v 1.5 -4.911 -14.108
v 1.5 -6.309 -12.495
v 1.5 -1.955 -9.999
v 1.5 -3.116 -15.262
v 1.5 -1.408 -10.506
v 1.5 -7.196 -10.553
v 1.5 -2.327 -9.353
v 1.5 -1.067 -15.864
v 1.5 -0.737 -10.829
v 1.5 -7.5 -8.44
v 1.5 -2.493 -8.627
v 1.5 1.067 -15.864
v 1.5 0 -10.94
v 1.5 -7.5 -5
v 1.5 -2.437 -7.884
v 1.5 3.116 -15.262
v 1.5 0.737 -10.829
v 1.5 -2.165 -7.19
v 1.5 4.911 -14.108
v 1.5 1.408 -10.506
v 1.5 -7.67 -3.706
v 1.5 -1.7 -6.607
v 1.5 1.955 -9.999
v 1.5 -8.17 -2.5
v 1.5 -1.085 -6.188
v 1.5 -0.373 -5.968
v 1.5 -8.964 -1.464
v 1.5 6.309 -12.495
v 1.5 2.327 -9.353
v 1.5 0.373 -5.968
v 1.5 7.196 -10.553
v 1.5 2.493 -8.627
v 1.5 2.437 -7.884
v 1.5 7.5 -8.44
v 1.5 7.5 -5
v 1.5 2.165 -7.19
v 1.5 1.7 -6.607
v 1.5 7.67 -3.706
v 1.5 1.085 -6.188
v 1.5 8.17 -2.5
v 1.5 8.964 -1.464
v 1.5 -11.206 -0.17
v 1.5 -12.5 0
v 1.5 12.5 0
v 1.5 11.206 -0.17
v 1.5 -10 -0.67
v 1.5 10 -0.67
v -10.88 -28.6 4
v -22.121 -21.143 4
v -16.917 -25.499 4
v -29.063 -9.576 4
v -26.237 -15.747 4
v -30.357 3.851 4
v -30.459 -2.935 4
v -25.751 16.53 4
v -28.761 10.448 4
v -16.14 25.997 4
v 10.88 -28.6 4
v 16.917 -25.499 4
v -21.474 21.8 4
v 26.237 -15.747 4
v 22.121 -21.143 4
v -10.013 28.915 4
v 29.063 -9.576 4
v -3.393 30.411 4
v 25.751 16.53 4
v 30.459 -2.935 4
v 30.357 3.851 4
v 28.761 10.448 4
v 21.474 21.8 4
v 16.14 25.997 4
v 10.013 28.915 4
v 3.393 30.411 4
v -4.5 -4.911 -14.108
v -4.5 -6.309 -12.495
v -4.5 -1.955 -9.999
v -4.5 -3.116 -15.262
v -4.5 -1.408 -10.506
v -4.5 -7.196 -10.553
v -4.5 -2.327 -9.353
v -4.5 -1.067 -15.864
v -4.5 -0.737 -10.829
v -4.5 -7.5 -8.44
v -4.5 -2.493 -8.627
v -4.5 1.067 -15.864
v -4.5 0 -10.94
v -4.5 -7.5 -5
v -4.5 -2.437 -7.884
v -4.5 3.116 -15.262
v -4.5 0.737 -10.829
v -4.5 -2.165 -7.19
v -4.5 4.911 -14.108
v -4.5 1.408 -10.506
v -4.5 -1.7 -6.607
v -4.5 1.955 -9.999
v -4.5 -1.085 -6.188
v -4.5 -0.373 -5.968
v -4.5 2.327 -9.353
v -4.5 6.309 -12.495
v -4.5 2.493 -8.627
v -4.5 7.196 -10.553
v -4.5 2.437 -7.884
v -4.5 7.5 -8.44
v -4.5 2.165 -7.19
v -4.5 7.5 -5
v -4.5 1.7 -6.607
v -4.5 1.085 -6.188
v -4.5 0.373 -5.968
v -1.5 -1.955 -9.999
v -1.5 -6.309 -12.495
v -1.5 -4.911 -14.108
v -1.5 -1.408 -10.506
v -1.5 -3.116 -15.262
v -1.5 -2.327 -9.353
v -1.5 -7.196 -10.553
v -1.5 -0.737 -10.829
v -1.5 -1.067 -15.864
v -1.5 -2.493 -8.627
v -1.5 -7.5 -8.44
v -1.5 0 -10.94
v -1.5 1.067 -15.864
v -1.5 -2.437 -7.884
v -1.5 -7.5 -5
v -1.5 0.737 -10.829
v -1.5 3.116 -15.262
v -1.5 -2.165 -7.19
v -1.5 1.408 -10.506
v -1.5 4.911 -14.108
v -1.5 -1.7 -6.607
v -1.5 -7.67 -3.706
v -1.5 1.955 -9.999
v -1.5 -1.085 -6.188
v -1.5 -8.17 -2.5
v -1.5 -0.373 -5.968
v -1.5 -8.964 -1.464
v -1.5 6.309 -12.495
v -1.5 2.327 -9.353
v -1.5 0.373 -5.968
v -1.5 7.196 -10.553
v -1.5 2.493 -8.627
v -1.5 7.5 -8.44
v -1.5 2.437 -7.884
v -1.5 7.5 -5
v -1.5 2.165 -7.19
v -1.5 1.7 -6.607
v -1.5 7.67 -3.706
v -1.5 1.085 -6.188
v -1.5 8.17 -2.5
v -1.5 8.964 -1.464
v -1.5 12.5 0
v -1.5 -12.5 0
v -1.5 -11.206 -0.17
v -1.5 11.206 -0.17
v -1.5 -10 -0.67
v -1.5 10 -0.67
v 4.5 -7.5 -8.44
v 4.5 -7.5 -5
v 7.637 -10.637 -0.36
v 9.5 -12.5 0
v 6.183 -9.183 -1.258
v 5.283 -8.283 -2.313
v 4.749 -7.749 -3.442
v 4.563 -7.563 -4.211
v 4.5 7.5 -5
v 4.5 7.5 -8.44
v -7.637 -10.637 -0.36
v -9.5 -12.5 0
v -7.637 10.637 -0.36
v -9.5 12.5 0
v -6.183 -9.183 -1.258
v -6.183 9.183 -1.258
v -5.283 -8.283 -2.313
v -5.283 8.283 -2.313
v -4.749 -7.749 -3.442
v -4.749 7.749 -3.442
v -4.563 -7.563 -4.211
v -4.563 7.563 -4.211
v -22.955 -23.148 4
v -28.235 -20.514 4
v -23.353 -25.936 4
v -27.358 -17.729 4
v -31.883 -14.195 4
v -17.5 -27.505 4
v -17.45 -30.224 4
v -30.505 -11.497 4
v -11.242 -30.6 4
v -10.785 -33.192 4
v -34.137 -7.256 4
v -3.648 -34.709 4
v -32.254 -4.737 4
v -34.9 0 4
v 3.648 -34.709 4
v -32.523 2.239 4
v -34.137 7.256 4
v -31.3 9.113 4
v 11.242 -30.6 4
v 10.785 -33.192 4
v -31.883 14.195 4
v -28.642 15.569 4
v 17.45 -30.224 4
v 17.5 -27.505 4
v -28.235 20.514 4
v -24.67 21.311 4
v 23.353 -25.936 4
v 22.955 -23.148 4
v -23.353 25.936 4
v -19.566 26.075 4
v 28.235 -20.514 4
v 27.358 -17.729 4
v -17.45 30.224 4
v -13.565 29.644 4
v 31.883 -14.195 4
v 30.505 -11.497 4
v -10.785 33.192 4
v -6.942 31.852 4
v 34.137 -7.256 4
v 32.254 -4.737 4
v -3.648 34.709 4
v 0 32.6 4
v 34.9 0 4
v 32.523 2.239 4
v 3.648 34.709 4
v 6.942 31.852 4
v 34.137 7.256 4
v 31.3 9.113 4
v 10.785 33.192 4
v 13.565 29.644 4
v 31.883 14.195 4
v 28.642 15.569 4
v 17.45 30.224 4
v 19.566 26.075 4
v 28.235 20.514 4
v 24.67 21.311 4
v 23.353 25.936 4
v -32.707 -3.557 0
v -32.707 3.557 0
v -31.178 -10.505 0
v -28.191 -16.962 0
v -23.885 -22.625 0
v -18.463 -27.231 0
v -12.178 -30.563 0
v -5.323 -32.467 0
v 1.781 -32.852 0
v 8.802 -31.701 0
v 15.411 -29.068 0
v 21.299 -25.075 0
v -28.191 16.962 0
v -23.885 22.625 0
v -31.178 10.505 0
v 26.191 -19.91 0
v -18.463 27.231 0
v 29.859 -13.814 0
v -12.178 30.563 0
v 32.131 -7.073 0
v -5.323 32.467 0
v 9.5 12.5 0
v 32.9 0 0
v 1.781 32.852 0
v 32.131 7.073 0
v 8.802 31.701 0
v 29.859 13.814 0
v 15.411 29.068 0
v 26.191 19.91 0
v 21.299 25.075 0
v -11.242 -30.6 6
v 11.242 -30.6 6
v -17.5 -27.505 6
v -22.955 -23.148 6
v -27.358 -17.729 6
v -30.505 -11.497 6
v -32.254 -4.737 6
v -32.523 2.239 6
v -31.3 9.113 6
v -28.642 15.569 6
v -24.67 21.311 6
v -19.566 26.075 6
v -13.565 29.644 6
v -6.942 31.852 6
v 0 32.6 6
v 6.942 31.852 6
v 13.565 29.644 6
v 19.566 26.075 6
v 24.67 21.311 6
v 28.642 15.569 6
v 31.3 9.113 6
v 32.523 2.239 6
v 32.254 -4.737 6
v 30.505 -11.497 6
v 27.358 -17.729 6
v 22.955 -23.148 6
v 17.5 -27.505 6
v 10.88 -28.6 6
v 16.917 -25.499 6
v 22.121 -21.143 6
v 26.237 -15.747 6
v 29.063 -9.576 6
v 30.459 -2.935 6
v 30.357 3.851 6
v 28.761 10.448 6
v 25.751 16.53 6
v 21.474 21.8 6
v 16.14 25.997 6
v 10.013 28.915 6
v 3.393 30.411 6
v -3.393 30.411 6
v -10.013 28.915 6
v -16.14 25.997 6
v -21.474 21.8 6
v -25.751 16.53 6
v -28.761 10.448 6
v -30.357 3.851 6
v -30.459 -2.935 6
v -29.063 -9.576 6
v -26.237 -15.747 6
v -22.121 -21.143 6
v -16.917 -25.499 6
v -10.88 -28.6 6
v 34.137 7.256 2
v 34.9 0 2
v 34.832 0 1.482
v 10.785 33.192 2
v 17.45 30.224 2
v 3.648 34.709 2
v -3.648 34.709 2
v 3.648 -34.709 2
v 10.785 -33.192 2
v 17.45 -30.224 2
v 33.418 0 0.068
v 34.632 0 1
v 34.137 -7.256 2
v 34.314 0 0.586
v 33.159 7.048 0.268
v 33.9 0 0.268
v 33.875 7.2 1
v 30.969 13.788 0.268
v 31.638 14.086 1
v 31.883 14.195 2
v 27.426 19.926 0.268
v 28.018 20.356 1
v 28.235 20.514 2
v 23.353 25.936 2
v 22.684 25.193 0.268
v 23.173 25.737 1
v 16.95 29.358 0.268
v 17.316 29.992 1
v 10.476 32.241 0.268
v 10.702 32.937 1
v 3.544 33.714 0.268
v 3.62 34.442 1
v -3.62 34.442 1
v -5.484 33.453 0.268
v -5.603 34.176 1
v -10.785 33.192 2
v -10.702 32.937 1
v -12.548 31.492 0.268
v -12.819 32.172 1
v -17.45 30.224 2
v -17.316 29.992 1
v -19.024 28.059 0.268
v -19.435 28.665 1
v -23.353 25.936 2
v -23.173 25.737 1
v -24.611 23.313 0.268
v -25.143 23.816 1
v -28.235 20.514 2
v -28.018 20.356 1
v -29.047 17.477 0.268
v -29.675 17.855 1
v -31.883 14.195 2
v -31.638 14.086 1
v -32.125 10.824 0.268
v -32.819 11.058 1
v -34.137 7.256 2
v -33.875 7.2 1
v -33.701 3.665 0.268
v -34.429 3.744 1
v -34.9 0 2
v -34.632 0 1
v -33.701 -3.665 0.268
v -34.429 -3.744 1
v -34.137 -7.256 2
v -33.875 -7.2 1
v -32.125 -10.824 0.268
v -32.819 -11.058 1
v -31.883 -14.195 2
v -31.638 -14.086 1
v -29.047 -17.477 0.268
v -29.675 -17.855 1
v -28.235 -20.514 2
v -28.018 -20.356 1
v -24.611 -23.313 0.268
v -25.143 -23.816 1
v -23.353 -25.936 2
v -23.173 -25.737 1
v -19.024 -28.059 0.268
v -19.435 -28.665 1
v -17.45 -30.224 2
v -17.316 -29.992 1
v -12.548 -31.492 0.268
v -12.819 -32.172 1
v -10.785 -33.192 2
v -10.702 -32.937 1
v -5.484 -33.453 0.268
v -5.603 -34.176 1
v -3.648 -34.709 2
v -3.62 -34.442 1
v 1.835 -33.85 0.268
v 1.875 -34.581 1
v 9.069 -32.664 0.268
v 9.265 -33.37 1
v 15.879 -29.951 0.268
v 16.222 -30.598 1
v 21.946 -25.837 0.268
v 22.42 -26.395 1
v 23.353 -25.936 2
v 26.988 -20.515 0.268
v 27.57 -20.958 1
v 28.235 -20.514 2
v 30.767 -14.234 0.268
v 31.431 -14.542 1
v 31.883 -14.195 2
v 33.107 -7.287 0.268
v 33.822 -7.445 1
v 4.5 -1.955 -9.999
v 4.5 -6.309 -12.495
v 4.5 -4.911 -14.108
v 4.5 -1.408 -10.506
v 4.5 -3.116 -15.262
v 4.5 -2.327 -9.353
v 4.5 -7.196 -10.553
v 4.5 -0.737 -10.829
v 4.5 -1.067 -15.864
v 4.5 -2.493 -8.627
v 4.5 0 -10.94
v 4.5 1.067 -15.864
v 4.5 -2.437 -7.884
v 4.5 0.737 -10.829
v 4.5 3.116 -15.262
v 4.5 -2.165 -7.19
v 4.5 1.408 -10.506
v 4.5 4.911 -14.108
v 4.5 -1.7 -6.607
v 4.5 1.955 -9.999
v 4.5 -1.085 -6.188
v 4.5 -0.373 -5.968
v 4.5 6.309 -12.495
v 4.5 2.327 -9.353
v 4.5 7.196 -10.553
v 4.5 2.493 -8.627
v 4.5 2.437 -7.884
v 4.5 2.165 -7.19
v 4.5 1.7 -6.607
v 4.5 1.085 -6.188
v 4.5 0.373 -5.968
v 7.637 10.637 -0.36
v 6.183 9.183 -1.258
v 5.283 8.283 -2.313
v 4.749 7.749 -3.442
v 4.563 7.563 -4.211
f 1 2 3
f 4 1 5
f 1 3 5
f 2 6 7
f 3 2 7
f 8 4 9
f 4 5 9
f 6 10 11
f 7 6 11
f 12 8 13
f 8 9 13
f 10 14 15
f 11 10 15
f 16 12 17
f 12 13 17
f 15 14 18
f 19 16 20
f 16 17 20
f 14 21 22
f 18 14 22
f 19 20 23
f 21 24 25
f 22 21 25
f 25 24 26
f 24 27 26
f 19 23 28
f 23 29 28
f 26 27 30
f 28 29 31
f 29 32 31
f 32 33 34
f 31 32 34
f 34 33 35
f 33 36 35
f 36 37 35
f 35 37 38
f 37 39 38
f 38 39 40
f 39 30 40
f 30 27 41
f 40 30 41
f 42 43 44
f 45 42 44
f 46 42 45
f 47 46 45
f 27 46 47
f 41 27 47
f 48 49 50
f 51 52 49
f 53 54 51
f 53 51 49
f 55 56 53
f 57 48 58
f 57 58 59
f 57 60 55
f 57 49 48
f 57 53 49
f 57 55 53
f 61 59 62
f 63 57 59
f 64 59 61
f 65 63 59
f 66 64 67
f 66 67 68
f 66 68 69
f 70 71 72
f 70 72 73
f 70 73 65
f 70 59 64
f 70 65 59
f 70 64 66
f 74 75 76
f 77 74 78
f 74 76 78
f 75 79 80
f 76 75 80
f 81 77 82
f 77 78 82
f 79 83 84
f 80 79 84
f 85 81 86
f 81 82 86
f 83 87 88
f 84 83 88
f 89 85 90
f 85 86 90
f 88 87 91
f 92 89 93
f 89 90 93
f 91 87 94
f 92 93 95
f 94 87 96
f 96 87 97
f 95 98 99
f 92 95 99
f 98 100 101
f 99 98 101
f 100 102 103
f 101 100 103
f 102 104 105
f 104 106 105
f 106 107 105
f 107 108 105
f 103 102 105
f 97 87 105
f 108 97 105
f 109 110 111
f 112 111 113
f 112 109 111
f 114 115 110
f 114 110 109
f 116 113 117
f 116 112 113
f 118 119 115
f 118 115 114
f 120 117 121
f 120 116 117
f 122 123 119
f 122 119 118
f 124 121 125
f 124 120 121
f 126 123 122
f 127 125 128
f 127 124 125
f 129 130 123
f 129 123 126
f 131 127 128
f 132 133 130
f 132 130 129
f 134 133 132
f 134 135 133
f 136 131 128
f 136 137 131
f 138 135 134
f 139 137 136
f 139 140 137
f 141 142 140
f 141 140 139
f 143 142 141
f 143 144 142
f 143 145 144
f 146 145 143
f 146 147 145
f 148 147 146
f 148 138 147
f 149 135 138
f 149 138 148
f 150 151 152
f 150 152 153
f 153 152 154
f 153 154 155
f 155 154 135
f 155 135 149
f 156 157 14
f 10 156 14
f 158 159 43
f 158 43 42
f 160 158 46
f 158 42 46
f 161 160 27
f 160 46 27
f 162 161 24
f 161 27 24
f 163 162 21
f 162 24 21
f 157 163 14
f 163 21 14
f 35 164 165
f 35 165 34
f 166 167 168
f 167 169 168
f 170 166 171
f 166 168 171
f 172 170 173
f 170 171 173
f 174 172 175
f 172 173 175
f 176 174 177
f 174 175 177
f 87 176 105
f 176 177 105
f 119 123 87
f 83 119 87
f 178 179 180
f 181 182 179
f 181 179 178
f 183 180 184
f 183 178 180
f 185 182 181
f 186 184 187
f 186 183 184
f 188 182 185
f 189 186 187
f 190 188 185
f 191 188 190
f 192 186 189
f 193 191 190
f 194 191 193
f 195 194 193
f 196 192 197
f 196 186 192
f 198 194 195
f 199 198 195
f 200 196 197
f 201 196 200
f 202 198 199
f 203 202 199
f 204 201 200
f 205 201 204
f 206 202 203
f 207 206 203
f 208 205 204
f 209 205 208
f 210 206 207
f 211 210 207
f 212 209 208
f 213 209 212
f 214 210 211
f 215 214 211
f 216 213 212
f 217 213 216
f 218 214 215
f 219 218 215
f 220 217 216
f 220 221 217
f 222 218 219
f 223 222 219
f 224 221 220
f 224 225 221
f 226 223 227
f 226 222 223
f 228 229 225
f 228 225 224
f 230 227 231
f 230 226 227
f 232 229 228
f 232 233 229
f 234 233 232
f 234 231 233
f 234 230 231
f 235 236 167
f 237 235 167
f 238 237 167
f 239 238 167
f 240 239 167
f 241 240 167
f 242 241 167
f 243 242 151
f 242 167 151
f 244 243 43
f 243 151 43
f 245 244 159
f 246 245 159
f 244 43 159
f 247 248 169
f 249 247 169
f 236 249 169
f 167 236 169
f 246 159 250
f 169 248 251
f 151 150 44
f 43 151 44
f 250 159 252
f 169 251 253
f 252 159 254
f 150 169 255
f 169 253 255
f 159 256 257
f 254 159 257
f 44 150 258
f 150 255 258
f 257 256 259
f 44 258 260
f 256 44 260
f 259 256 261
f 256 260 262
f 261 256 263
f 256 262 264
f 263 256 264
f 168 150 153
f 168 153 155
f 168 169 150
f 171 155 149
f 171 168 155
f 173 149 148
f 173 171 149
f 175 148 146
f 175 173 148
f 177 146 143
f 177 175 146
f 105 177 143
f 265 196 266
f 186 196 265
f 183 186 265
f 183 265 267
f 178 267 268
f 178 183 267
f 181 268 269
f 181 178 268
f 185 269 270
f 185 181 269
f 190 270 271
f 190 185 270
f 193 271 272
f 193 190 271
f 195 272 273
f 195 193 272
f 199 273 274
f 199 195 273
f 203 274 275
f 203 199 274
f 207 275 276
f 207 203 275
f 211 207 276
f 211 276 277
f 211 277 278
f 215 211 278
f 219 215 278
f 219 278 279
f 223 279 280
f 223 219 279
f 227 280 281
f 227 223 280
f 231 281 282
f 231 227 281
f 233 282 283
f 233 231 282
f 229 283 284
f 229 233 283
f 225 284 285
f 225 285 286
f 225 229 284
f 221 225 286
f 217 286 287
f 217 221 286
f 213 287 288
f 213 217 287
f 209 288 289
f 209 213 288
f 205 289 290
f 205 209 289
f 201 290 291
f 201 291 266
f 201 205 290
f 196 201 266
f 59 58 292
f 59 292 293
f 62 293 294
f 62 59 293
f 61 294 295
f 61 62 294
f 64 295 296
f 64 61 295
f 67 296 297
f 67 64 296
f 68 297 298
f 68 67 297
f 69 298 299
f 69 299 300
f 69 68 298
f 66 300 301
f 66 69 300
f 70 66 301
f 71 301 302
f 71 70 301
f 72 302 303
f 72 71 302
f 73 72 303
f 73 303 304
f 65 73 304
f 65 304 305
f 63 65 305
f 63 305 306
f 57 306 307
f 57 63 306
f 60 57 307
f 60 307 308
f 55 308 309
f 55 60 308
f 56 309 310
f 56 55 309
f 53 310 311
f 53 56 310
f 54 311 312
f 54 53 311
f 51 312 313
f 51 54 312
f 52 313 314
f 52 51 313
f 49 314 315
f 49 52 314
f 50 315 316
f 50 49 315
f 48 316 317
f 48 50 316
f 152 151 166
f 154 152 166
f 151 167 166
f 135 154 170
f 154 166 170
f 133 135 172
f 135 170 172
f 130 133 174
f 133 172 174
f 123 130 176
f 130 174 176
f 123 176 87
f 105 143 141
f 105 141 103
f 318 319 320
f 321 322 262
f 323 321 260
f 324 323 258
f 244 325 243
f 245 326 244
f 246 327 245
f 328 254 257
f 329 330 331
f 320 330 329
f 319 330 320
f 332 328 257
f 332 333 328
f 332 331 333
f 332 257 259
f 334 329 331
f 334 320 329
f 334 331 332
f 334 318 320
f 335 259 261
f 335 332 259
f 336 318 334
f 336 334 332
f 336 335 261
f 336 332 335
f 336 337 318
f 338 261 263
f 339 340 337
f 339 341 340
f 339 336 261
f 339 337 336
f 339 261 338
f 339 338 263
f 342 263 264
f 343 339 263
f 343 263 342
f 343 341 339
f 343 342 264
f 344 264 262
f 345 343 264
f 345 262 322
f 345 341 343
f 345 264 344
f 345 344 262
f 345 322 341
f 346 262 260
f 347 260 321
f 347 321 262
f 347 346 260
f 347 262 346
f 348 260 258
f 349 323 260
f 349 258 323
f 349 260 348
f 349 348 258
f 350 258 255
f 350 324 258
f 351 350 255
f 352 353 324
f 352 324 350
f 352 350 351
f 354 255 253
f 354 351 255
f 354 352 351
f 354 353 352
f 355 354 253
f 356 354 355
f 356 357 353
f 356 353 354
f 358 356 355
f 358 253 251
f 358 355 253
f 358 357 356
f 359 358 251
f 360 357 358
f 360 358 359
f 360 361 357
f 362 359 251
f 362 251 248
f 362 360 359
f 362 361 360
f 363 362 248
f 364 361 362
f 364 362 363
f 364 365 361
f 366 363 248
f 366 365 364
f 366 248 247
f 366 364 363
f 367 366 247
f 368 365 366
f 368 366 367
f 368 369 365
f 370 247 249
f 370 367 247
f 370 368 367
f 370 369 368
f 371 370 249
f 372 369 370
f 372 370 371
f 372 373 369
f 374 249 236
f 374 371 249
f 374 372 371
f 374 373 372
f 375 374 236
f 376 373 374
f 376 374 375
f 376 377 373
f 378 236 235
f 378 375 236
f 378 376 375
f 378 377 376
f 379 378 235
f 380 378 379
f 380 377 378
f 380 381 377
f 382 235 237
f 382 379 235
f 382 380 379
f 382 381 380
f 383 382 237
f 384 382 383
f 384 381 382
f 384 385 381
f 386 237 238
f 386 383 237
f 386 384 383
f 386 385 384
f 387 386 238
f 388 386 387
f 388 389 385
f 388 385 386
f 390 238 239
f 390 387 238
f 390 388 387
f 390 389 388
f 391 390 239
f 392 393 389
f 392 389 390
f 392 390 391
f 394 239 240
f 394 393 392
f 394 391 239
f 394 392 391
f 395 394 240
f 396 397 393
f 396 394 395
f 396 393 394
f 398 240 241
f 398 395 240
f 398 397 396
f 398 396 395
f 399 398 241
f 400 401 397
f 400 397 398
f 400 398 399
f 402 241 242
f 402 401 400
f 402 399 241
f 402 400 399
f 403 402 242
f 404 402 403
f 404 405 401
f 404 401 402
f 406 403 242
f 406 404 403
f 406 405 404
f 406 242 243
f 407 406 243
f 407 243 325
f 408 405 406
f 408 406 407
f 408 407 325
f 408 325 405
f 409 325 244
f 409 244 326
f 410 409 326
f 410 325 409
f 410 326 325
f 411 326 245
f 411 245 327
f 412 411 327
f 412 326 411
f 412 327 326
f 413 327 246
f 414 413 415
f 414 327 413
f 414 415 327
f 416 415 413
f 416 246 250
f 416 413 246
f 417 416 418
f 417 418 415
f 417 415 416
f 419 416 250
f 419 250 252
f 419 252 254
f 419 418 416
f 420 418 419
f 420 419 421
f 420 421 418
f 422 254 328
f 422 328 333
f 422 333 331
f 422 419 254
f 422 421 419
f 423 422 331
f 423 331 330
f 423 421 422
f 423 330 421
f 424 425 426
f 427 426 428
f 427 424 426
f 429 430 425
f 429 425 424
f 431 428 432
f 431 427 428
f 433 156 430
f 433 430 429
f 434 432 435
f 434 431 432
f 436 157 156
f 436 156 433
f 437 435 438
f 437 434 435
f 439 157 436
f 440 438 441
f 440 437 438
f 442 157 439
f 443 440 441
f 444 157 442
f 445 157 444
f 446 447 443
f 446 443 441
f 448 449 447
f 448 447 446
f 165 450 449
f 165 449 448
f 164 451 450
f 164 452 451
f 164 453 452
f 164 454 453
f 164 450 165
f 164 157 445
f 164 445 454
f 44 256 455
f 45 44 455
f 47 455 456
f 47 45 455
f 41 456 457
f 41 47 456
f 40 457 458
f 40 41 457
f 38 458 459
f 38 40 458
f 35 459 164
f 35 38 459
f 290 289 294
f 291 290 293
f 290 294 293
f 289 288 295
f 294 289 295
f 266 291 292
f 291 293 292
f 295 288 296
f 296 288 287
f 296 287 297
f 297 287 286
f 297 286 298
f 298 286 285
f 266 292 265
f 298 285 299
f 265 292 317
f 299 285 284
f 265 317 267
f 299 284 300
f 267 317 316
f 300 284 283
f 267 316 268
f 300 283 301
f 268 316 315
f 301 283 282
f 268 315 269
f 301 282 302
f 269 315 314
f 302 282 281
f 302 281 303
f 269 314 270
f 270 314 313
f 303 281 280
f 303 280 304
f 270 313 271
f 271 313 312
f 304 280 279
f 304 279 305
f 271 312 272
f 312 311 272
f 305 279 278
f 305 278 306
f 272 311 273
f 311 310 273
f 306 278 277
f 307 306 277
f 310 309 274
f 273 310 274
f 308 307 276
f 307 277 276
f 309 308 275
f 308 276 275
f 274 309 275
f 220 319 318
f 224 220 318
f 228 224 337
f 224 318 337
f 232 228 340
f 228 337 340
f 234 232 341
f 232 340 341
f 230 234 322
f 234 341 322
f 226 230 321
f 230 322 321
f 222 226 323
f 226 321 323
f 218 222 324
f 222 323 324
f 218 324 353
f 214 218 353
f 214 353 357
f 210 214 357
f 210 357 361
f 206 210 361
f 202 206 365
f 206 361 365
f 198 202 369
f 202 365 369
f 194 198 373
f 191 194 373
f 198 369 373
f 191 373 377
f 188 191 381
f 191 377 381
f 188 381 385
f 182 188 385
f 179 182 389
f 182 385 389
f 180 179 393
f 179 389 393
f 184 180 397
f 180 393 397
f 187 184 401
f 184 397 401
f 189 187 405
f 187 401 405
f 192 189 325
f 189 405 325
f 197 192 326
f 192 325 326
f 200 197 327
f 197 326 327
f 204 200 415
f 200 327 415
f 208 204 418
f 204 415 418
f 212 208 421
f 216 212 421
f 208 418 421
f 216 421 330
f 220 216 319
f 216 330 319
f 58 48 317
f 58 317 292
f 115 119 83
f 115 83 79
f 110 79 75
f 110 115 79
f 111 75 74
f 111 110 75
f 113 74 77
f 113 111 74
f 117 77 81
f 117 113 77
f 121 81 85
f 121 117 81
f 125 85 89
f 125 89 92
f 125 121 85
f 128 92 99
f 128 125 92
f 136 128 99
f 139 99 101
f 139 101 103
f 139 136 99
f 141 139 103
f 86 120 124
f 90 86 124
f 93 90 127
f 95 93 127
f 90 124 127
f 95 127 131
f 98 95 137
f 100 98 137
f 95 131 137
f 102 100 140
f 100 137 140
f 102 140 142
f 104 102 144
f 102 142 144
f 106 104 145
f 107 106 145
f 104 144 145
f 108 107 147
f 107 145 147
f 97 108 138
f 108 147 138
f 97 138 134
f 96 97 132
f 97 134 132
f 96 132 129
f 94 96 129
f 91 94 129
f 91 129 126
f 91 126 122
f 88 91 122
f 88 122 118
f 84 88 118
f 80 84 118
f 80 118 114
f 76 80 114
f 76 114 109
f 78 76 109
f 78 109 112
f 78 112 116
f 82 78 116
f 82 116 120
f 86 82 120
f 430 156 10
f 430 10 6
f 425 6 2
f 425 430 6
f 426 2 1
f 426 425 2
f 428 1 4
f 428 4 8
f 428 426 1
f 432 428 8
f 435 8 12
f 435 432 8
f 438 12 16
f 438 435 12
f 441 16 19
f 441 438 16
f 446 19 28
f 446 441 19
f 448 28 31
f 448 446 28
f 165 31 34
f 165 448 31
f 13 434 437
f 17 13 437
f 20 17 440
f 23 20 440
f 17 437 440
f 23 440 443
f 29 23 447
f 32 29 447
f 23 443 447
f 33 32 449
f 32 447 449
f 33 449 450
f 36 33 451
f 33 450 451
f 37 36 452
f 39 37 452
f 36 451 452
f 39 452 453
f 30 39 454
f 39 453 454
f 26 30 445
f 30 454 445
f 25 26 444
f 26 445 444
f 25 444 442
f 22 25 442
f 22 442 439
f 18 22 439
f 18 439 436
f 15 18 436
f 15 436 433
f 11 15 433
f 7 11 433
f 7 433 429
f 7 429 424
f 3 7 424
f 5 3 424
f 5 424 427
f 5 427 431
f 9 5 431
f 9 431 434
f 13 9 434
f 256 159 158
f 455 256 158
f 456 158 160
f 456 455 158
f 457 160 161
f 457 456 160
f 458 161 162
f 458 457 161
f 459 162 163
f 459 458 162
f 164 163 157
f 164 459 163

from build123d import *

# Parameters (mm, degrees)
ESQUISSE1_R             = 34.9
BOSS_EXTRU_1_DEPTH      = 4
ESQUISSE4_W             = 3
ESQUISSE4_H             = 15
BOSS_EXTRU_3_DEPTH      = 20
ENL_V_MAT_EXTRU_2_DEPTH = 57.306038753
CONG_1_R                = 5
ESQUISSE6_R             = 2.5
ENL_V_MAT_EXTRU_3_DEPTH = 55.995032503
BOSS_EXTRU_4_DEPTH      = 2
CONG_2_R                = 2


with BuildPart() as part:
    # Esquisse1 → Boss.-Extru.1 (new body)
    with BuildSketch(Plane.XY):
        Circle(ESQUISSE1_R)
    extrude(amount=BOSS_EXTRU_1_DEPTH)

    # Esquisse4 → Boss.-Extru.3 (add)
    with BuildSketch(Plane(origin=(0, 0, 0), x_dir=(-1, 0, 0), z_dir=(0, 0, -1))):
        with Locations((3, 0)):
            Rectangle(ESQUISSE4_W, ESQUISSE4_H)
        with Locations((-3, 0)):
            Rectangle(ESQUISSE4_W, ESQUISSE4_H)
    extrude(amount=BOSS_EXTRU_3_DEPTH)

    # Esquisse5 → Enlèv. mat.-Extru.2 (cut, through all)
    with BuildSketch(Plane(origin=(4.5, 0, 0), x_dir=(0, 0, -1), z_dir=(1, 0, 0))):
        with BuildLine():
            Line((8.44, 7.5), (20, 7.5))
            Line((20, 7.5), (20, -7.5))
            Line((20, -7.5), (8.44, -7.5))
            ThreePointArc((8.44, -7.5), (15.94, 0), (8.44, 7.5))
        make_face()
    extrude(amount=-ENL_V_MAT_EXTRU_2_DEPTH, mode=Mode.SUBTRACT)

    # Congé1
    cong_1_edges = [part.edges().sort_by_distance(p)[0] for p in [
        (-3, 7.5, 0),
        (-3, -7.5, 0),
        (-4.5, 0, 0),
        (4.5, 0, 0),
        (3, -7.5, 0),
        (3, 7.5, 0),
    ]]
    fillet(cong_1_edges, radius=CONG_1_R)

    # Esquisse6 → Enlèv. mat.-Extru.3 (cut, through all)
    with BuildSketch(Plane(origin=(4.5, 0, 0), x_dir=(0, 0, -1), z_dir=(1, 0, 0))):
        with Locations((8.44, 0)):
            Circle(ESQUISSE6_R)
    extrude(amount=-ENL_V_MAT_EXTRU_3_DEPTH, mode=Mode.SUBTRACT)

    # Esquisse2 → Boss.-Extru.4 (add)
    with BuildSketch(Plane.XY.offset(4)):
        with BuildLine():
            ThreePointArc((-11.241763565, -30.600371762), (0, 32.6), (11.241763565, -30.600371762))
            Line((11.241763565, -30.600371762), (-11.241763565, -30.600371762))
        make_face()
        with BuildLine():
            Line((-10.880199222, -28.600371762), (10.880199222, -28.600371762))
            ThreePointArc((10.880199222, -28.600371762), (0, 30.6), (-10.880199222, -28.600371762))
        make_face(mode=Mode.SUBTRACT)
    extrude(amount=BOSS_EXTRU_4_DEPTH)

    # Congé2
    cong_2_edges = [part.edges().sort_by_distance(p)[0] for p in [
        (-34.9, 0, 0),
    ]]
    fillet(cong_2_edges, radius=CONG_2_R)


solid = part.part
